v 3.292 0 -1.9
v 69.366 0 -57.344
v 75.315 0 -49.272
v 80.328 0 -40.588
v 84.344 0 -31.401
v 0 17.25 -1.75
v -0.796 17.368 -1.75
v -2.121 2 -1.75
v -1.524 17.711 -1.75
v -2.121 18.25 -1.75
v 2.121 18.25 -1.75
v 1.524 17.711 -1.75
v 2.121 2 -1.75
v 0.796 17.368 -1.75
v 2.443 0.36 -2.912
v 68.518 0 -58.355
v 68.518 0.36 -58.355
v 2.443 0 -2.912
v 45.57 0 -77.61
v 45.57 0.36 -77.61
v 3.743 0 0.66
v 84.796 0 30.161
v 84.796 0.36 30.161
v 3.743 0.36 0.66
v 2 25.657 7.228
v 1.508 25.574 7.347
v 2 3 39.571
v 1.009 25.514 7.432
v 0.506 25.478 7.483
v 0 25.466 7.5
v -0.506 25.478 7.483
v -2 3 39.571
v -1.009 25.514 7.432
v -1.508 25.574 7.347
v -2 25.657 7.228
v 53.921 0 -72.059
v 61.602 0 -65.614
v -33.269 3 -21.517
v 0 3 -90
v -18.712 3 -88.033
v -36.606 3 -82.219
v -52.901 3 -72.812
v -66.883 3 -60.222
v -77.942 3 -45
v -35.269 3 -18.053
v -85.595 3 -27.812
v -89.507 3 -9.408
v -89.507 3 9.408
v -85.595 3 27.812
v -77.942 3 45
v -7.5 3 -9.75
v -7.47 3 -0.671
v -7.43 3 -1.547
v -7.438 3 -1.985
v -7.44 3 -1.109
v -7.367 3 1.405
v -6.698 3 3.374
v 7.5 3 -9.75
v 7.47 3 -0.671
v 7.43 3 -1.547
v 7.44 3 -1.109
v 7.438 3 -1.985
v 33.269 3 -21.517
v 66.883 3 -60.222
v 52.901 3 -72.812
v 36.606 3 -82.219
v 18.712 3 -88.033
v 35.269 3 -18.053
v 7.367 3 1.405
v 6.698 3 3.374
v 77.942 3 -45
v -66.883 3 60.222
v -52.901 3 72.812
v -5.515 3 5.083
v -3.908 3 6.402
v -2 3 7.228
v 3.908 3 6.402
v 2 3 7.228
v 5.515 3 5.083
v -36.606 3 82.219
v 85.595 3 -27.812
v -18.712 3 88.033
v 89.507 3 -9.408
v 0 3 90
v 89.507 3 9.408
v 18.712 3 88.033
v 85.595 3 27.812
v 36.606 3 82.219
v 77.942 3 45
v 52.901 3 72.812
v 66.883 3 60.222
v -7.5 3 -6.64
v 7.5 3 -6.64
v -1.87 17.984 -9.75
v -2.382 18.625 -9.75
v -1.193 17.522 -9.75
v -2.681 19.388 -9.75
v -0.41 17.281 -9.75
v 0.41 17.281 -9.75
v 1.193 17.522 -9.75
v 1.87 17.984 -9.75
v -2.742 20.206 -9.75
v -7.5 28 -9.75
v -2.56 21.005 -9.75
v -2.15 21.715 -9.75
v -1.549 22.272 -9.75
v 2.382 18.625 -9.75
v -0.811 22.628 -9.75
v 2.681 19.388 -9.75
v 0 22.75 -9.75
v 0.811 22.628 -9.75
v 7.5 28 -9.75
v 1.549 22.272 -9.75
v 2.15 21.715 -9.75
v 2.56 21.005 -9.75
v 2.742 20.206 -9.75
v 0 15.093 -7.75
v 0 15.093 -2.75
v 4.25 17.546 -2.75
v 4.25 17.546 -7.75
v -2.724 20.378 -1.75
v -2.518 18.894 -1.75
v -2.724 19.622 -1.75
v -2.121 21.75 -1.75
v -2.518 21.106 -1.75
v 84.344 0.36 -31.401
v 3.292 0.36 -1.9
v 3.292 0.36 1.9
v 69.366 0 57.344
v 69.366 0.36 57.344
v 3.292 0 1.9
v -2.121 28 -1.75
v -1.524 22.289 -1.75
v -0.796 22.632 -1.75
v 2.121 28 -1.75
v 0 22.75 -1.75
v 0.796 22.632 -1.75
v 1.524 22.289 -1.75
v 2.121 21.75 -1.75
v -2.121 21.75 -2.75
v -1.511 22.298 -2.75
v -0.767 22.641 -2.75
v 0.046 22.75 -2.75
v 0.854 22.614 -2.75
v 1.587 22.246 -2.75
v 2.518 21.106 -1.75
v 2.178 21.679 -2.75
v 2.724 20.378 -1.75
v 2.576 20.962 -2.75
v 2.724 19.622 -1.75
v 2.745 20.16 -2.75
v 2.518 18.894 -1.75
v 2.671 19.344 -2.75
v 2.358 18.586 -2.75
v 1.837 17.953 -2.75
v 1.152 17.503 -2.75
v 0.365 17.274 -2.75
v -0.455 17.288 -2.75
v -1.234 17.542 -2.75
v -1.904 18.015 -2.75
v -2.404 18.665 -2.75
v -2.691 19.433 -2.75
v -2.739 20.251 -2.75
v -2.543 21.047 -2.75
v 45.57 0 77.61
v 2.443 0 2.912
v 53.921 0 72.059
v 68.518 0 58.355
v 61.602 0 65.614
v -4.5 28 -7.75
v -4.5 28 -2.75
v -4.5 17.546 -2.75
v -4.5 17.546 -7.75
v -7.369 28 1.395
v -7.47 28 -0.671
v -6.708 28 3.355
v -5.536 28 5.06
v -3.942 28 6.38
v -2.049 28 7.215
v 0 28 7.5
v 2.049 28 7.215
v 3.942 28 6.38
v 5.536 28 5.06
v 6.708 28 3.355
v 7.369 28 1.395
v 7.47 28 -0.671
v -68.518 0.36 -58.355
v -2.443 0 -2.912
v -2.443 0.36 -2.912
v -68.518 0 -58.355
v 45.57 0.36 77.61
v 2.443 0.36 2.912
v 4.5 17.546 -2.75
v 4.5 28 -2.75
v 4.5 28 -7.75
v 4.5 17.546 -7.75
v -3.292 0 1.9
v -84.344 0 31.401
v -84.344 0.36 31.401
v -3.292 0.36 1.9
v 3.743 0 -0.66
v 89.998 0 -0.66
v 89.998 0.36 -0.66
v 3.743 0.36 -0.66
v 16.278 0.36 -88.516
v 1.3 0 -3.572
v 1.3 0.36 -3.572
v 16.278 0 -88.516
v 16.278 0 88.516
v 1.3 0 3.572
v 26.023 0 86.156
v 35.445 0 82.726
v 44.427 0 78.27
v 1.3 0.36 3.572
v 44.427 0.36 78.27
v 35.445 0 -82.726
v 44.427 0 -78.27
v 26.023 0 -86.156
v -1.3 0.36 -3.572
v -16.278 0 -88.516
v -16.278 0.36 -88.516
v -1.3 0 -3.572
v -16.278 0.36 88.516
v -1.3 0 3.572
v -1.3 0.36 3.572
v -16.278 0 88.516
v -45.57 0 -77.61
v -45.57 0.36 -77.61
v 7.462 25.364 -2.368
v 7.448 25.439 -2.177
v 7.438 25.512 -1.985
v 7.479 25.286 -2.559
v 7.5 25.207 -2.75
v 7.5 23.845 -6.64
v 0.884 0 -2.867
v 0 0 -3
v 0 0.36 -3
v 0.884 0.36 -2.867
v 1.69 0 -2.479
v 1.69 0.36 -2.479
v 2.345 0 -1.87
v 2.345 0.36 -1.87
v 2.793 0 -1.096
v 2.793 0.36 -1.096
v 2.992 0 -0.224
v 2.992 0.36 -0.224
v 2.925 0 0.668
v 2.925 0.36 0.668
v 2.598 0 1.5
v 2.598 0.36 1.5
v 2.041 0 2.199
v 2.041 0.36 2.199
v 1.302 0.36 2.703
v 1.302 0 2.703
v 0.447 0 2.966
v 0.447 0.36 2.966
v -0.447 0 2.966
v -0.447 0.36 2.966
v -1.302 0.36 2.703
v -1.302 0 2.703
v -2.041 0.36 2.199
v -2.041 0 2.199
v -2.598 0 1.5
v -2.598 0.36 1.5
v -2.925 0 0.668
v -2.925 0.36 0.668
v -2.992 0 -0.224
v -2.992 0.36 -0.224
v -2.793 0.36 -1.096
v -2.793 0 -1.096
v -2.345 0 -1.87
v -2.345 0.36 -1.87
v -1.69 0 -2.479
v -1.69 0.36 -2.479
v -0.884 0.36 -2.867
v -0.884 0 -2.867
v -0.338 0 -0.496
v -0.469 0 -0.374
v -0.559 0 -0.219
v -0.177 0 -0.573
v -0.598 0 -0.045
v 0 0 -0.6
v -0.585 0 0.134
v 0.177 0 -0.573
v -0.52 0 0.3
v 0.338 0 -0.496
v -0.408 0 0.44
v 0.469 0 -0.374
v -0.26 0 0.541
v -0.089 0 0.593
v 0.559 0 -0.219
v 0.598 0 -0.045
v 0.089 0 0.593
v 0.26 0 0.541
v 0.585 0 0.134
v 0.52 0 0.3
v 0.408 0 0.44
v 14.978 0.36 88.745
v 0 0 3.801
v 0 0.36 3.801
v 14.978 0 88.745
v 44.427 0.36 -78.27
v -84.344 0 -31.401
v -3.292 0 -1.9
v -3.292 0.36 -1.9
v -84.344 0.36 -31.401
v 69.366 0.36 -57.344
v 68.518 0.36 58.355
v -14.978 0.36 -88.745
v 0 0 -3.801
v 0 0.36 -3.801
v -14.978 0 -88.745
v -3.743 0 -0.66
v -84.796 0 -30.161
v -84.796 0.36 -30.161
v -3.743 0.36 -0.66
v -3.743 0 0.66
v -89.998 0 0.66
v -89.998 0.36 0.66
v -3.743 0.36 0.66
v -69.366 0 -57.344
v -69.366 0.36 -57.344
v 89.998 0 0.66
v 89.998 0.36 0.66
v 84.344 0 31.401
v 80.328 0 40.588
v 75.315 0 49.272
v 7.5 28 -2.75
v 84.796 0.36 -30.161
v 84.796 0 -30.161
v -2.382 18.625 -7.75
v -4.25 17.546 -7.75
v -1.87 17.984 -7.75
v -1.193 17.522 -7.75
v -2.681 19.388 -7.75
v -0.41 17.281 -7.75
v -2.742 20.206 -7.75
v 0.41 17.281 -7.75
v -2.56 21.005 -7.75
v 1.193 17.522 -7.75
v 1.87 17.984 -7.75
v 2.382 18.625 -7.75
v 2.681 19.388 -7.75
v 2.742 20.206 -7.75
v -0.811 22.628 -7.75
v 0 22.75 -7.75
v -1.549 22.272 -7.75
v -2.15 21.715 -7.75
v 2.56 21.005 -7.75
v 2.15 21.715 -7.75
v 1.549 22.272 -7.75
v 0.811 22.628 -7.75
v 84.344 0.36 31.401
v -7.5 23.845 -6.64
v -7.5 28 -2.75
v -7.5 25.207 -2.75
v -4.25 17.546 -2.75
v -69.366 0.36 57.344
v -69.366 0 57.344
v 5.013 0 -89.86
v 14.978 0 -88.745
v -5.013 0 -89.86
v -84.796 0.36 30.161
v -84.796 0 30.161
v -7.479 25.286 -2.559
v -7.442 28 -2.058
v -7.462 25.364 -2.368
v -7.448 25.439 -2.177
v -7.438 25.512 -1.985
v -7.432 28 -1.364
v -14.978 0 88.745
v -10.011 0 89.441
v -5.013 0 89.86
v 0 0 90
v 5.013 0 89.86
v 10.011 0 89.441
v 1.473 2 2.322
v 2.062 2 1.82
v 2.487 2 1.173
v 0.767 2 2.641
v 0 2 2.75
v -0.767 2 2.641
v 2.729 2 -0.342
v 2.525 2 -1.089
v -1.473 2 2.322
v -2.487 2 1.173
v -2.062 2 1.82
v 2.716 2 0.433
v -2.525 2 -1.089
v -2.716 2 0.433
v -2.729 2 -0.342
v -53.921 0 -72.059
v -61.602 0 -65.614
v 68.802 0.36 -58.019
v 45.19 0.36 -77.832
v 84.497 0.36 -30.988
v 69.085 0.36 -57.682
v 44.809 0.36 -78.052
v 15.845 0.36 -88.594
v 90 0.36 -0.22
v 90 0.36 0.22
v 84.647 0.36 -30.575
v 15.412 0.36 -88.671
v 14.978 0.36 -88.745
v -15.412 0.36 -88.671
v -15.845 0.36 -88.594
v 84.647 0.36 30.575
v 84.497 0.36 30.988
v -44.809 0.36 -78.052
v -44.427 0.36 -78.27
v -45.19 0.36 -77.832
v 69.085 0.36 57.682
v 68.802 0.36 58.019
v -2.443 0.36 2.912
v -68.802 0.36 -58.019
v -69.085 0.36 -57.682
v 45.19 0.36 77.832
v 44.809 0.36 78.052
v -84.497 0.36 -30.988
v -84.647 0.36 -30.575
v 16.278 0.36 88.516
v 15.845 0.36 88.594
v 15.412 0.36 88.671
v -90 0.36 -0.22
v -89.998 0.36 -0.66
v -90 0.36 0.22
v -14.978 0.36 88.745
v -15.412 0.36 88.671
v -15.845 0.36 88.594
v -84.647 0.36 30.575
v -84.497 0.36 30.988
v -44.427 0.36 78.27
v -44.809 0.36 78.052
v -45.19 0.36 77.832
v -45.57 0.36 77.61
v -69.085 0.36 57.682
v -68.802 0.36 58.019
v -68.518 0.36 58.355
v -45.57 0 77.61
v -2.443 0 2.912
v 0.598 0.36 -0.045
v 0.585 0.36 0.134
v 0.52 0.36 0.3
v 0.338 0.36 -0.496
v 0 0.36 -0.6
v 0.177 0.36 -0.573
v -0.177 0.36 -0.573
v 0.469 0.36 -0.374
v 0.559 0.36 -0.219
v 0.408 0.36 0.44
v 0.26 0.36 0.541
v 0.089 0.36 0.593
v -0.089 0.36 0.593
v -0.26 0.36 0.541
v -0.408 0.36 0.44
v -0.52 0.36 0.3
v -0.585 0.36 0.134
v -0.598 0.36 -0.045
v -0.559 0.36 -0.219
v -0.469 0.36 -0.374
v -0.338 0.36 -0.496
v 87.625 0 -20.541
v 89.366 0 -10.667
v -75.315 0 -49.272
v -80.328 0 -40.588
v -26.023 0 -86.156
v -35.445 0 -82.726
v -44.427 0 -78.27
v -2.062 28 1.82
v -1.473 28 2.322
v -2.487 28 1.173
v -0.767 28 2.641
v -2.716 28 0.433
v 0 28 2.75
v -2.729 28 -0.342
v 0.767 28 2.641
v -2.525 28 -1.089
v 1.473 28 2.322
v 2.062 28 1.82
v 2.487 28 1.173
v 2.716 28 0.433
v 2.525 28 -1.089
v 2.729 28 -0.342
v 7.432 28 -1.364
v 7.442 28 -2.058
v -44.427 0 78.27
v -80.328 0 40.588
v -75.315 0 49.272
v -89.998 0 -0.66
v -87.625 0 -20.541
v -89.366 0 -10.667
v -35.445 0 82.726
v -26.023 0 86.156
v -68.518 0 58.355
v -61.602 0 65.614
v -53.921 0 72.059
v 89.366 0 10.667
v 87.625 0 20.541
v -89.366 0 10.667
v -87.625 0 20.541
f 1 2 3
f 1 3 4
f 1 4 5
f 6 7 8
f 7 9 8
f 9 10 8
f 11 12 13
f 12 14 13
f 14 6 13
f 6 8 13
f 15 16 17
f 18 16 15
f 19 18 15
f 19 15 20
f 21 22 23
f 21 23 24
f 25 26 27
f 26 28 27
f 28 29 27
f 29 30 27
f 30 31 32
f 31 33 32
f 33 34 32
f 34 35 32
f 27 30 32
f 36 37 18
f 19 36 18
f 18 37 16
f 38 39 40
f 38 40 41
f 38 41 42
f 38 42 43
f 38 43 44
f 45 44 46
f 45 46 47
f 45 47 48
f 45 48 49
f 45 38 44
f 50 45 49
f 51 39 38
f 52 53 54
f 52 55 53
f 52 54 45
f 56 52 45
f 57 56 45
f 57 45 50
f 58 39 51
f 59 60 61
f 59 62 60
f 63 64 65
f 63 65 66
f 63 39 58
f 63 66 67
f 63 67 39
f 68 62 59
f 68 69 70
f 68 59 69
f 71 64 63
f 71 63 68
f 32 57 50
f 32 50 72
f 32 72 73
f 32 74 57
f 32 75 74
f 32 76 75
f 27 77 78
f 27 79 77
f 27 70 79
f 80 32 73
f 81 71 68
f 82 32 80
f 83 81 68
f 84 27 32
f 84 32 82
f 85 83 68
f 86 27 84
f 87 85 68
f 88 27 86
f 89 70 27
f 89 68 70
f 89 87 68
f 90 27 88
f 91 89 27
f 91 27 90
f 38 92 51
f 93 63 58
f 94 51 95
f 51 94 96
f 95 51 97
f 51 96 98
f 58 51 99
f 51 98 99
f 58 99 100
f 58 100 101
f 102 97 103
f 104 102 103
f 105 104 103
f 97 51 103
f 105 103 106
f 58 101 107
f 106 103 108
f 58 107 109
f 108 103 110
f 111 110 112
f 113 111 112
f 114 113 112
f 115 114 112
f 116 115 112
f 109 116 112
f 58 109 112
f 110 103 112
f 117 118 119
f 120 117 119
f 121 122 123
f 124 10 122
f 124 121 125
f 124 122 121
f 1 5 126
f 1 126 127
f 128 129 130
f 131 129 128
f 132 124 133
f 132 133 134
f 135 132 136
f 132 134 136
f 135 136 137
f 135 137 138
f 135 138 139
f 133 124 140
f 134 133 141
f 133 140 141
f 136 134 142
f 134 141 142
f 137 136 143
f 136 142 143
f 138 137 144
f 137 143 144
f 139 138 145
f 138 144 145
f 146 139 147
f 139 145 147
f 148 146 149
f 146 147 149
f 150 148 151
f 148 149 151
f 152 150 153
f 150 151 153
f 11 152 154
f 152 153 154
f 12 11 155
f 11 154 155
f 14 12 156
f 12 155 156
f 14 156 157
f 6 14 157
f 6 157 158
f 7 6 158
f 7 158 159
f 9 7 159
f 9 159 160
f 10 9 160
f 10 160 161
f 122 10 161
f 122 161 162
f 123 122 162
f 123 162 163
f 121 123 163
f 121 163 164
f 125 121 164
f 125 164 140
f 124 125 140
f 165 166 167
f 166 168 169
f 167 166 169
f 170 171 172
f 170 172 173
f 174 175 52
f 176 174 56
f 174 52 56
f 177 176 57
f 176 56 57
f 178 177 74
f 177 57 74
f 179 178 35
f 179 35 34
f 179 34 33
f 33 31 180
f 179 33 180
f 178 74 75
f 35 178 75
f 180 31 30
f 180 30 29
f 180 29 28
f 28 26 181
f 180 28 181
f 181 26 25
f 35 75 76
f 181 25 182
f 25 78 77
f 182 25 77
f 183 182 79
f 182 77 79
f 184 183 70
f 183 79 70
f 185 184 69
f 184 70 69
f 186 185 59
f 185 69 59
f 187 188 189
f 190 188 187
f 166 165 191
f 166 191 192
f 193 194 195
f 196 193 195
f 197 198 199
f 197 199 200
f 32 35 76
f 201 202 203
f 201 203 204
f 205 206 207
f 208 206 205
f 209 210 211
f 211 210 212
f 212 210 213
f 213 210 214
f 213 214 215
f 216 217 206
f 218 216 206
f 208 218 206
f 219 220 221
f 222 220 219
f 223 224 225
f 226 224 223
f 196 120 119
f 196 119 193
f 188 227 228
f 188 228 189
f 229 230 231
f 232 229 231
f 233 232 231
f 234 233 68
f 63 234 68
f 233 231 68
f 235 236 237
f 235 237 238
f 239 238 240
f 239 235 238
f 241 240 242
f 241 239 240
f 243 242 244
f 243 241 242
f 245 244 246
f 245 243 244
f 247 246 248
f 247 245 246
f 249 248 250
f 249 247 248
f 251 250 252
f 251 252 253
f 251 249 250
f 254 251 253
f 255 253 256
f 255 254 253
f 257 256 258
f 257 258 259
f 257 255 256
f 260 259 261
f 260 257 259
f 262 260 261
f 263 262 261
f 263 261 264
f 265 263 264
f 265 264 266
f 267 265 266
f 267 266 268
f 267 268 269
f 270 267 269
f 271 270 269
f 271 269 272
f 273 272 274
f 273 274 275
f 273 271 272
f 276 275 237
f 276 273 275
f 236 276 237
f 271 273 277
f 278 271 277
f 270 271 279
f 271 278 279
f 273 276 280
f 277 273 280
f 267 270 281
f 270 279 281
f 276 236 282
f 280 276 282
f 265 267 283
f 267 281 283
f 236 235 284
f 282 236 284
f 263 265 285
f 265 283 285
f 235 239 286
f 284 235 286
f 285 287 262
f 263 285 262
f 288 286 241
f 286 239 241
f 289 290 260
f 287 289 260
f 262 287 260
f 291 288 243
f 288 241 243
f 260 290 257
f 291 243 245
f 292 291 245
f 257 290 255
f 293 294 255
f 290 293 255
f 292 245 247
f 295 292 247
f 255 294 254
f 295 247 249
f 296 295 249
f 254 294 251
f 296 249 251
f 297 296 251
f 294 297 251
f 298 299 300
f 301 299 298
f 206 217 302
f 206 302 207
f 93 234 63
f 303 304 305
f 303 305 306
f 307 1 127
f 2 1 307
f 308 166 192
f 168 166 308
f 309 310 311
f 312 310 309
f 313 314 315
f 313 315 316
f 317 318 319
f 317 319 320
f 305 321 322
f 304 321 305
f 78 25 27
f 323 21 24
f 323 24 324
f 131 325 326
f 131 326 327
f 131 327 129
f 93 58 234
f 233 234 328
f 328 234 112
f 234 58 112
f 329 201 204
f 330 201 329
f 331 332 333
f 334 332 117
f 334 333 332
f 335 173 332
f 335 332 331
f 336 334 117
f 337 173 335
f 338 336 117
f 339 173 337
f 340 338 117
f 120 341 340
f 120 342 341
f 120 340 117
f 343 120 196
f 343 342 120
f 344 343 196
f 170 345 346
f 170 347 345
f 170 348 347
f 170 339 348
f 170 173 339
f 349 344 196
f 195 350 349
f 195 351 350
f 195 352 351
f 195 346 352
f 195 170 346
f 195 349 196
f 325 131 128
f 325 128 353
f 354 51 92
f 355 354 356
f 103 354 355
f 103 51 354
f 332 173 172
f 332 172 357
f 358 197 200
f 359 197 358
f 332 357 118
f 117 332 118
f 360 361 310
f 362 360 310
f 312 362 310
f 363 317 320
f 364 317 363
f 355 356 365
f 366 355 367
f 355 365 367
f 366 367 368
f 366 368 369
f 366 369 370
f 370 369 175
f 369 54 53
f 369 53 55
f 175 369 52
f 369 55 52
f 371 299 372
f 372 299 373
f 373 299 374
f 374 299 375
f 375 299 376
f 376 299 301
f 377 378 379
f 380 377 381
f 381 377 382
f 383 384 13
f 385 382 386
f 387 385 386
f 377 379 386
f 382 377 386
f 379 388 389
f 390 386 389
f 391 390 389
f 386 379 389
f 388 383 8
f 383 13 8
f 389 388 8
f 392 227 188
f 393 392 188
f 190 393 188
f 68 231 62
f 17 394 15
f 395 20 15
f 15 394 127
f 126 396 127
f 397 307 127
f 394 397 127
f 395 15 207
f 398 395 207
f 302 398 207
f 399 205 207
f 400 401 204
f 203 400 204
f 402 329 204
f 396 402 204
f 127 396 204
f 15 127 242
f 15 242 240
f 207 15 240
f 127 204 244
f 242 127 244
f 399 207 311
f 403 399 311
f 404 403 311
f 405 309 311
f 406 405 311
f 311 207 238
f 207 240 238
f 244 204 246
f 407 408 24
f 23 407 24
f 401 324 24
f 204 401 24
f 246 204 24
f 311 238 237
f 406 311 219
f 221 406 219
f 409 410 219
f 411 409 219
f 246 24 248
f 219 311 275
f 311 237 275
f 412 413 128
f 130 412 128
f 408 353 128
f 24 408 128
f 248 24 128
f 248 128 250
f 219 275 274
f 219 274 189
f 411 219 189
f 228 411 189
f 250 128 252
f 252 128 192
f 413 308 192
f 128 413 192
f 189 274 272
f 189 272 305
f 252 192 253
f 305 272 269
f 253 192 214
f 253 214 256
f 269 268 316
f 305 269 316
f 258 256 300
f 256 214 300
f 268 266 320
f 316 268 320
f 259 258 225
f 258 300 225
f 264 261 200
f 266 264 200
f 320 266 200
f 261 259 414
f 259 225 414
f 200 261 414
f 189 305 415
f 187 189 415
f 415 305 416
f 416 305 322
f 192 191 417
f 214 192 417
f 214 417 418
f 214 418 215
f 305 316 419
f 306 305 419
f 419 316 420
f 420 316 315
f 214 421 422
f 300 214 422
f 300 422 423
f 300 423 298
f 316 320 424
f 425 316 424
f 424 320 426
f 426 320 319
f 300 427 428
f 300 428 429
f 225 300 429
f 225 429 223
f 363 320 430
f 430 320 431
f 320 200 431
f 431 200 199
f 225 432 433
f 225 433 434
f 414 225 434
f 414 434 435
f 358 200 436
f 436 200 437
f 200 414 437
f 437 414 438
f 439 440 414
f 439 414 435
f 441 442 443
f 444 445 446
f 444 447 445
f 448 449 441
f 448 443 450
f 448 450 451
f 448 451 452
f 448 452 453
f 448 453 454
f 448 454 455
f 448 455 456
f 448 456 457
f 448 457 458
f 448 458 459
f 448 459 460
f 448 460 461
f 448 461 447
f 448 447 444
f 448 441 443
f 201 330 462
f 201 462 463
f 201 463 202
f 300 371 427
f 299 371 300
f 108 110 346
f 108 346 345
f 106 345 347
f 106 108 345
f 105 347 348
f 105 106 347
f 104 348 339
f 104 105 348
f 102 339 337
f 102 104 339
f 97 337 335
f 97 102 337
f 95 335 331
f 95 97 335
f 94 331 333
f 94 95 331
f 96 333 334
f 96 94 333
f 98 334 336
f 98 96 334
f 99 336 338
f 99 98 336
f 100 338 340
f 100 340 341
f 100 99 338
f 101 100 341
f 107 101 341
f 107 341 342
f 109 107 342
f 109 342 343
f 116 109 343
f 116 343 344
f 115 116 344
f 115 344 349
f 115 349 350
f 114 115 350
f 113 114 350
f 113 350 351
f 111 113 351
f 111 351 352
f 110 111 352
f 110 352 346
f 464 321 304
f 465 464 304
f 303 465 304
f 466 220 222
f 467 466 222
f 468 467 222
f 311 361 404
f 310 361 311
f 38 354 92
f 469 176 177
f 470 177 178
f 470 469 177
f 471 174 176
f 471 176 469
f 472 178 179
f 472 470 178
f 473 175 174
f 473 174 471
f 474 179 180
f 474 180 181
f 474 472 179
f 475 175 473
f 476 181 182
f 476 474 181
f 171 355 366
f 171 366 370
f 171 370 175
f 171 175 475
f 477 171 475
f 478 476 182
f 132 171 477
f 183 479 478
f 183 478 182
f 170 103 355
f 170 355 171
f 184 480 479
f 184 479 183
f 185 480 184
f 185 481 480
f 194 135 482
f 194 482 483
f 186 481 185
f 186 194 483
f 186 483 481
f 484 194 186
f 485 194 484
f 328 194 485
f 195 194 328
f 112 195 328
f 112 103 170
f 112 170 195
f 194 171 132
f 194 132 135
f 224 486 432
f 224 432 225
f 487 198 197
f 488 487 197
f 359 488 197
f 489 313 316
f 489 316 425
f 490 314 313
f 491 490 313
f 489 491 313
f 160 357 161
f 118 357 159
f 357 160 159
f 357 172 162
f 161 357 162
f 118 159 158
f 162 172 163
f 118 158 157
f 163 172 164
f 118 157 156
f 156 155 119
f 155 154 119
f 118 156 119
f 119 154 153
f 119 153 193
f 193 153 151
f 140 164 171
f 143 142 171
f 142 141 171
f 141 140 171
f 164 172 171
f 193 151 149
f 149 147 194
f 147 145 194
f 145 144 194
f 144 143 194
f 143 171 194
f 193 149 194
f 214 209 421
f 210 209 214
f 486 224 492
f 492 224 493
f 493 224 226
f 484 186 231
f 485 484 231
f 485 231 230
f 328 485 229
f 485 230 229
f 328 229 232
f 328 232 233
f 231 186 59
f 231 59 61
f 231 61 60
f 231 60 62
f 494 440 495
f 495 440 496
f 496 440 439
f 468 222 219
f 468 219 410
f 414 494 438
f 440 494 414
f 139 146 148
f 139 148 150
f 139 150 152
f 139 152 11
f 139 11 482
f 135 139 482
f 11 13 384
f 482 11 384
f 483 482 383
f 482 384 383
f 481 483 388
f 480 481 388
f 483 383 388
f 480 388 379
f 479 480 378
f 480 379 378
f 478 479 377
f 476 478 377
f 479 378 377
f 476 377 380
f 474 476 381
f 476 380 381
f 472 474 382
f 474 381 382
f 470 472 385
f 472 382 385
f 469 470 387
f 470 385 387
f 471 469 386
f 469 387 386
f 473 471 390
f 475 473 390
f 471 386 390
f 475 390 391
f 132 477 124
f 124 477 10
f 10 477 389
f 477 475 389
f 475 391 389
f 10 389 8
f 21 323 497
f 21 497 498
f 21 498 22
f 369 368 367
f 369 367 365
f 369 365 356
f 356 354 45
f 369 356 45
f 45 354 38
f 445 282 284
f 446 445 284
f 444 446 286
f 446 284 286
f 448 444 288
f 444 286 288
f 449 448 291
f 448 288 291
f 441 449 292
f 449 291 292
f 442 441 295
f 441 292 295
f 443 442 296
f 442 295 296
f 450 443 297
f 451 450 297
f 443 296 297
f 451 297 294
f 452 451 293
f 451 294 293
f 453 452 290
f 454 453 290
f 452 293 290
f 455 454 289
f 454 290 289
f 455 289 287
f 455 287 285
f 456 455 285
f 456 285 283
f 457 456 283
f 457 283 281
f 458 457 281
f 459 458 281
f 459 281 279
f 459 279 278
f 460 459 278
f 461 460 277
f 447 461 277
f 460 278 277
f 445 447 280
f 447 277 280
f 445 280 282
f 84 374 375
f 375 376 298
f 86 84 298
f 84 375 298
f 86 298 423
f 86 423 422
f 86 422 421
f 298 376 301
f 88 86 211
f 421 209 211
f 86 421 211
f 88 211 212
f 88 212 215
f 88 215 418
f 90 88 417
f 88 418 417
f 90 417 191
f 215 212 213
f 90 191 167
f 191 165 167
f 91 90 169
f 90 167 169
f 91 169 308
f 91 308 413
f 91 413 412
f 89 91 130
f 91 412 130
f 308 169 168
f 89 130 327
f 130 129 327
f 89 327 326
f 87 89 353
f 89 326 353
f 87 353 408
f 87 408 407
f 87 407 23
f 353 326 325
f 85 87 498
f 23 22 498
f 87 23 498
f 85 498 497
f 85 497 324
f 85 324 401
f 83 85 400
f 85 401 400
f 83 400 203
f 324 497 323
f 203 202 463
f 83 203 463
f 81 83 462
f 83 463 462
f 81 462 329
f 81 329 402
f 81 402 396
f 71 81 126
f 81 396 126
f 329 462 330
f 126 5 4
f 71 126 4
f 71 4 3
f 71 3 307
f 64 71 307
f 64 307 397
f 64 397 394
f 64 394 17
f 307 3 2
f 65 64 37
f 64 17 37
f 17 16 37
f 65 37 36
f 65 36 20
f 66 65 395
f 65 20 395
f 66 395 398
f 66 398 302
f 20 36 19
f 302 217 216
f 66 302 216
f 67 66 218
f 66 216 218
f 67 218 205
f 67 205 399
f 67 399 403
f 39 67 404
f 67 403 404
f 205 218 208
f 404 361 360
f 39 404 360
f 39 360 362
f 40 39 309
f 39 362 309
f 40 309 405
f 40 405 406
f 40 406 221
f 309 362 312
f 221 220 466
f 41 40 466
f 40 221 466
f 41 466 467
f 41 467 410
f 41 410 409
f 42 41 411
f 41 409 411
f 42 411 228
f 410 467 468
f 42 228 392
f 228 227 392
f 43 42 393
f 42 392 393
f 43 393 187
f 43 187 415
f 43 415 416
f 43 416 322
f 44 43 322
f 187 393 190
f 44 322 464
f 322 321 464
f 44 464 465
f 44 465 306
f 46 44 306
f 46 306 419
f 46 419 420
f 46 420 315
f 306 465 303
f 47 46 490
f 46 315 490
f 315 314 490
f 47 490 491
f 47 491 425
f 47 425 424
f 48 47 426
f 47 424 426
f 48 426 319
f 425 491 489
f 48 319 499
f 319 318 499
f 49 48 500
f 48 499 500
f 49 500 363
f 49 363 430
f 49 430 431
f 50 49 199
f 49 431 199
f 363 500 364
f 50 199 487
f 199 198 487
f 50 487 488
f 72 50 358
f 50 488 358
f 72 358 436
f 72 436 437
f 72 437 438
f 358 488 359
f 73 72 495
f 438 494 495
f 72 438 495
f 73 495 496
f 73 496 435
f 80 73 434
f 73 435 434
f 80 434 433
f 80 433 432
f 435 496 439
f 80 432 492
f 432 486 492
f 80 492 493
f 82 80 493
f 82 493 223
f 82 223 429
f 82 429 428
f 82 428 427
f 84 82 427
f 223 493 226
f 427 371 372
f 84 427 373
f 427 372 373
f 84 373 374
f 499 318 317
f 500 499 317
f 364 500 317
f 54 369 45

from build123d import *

# Parameters (mm, degrees)
SKETCH1_R                = 90
BOSS_EXTRUDE1_DEPTH      = 3
SKETCH2_R                = 7.5
BOSS_EXTRUDE2_DEPTH      = 25
RIB5_REACH               = 132.323
SKETCH3_WALL_W           = 306.218438134
SKETCH3_WALL_H           = 4
CIRPATTERN1_COUNT        = 3
BOSS_EXTRUDE3_DEPTH      = 4
BOSS_EXTRUDE3_DEPTH_BACK = 3
BOSS_EXTRUDE3_START      = -5
SKETCH5_W                = 15
SKETCH5_H                = 25
SKETCH5_R                = 2.75
CUT_EXTRUDE3_DEPTH       = 130.711217711
CUT_EXTRUDE3_DEPTH_BACK  = 1
SKETCH8_R                = 2.75
CUT_EXTRUDE4_DEPTH       = 8
CUT_EXTRUDE1_START       = -1
CUT_EXTRUDE1_DEPTH       = 5
SKETCH9_W                = 11.211365442
SKETCH9_H                = 11.7257459
SKETCH9_R                = 2.75
BOSS_EXTRUDE4_DEPTH      = 2
SKETCH10_W               = 9
SKETCH10_H               = 5
CUT_EXTRUDE5_DEPTH       = 10.453739
FILLET1_START            = 2
FILLET1_DEPTH            = 26
SKETCH11_R               = 3
CUT_EXTRUDE6_DEPTH       = 0.36
SKETCH12_R               = 0.6
CUT_EXTRUDE7_DEPTH       = 0.36


with BuildPart() as part:
    # Sketch1 → Boss-Extrude1 (new body)
    with BuildSketch(Plane(origin=(0, 0, 0), x_dir=(1, 0, 0), z_dir=(0, 1, 0))):
        with Locations(Location((0, 0, 0), (0, 0, 270))):
            Circle(SKETCH1_R)
    extrude(amount=BOSS_EXTRUDE1_DEPTH)

    # Sketch2 → Boss-Extrude2 (add)
    with BuildSketch(Plane(origin=(0, 3, 0), x_dir=(1, 0, 0), z_dir=(0, 1, 0))):
        with Locations(Location((0, 0, 0), (0, 0, 270))):
            Circle(SKETCH2_R)
        with BuildLine():
            Line((-2.121320344, 1.75), (2.121320344, 1.75))
            ThreePointArc((2.121320344, 1.75), (0, -2.75), (-2.121320344, 1.75))
        make_face(mode=Mode.SUBTRACT)
    extrude(amount=BOSS_EXTRUDE2_DEPTH)

    # Sketch3 wall → Rib5 (add, up to next)
    with BuildSketch(Plane(origin=(0, 13.5, 24.582023983), x_dir=(0, -0.573748677161, 0.819031412985), z_dir=(0, -0.819031412985, -0.573748677161)), mode=Mode.PRIVATE) as rib5_sk1:
        Rectangle(SKETCH3_WALL_W, SKETCH3_WALL_H)
    rib5_tool1 = extrude(rib5_sk1.sketch, amount=RIB5_REACH, mode=Mode.PRIVATE) - part.part
    rib5 = rib5_tool1.solids().sort_by_distance((0, 13.5, 24.582023983))[0]
    add(rib5)

    # CirPattern1: Rib5 ×3 about axis
    cirpattern1_axis = Axis((0, 0, 0), (0, 1, 0))
    for i in range(1, CIRPATTERN1_COUNT):
        add(rib5.rotate(cirpattern1_axis, i * 360 / CIRPATTERN1_COUNT))

    # Sketch5 → Boss-Extrude3 (add, two sides: drawn at the far end of the back side and taken through both)
    with BuildSketch(Plane.XY.offset(-1.75).offset(BOSS_EXTRUDE3_START - BOSS_EXTRUDE3_DEPTH_BACK)):
        with Locations((0, 15.5)):
            Rectangle(SKETCH5_W, SKETCH5_H)
        with Locations(Location((0, 20, 0), (0, 0, 90))):
            Circle(SKETCH5_R, mode=Mode.SUBTRACT)
    extrude(amount=BOSS_EXTRUDE3_DEPTH + BOSS_EXTRUDE3_DEPTH_BACK)

    # Sketch7 → Cut-Extrude3 (cut, two sides: drawn at the far end of the back side and taken through both)
    with BuildSketch(Plane(origin=(0, 3, 0), x_dir=(1, 0, 0), z_dir=(0, 1, 0)).offset(-CUT_EXTRUDE3_DEPTH_BACK)):
        with BuildLine():
            Line((-2.121320344, 1.75), (2.121320344, 1.75))
            ThreePointArc((2.121320344, 1.75), (0, -2.75), (-2.121320344, 1.75))
        make_face()
    extrude(amount=CUT_EXTRUDE3_DEPTH + CUT_EXTRUDE3_DEPTH_BACK, mode=Mode.SUBTRACT)

    # Sketch8 → Cut-Extrude4 (cut)
    with BuildSketch(Plane(origin=(0, 0, -9.75), x_dir=(-1, 0, 0), z_dir=(0, 0, -1))):
        with Locations(Location((0, 20, 0), (0, 0, 39.521196359))):
            Circle(SKETCH8_R)
    extrude(amount=-CUT_EXTRUDE4_DEPTH, mode=Mode.SUBTRACT)

    # Sketch4 → Cut-Extrude1 (cut)
    with BuildSketch(Plane.XY.offset(-1.75).offset(CUT_EXTRUDE1_START)):
        Polygon((0, 24.907477288), (-4.25, 22.453738644), (-4.25, 17.546261356), (0, 15.092522712), (4.25, 17.546261356), (4.25, 22.453738644), align=None)
    extrude(amount=-CUT_EXTRUDE1_DEPTH, mode=Mode.SUBTRACT)

    # Sketch9 → Boss-Extrude4 (add)
    with BuildSketch(Plane(origin=(0, 0, -9.75), x_dir=(-1, 0, 0), z_dir=(0, 0, -1))):
        with Locations((0, 20)):
            Rectangle(SKETCH9_W, SKETCH9_H)
        with Locations(Location((0, 20, 0), (0, 0, 180))):
            Circle(SKETCH9_R, mode=Mode.SUBTRACT)
    extrude(amount=-BOSS_EXTRUDE4_DEPTH)

    # Sketch10 → Cut-Extrude5 (cut)
    with BuildSketch(Plane(origin=(0, 28, 0), x_dir=(1, 0, 0), z_dir=(0, 1, 0))):
        with Locations((0, 5.25)):
            Rectangle(SKETCH10_W, SKETCH10_H)
    extrude(amount=-CUT_EXTRUDE5_DEPTH, mode=Mode.SUBTRACT)

    # Fillet1: read off the stored shape, not the designer's step
    # Fillet1 outline → Fillet1 (add)
    with BuildSketch(Plane(origin=(0, 0, 0), x_dir=(1, 0, 0), z_dir=(0, 1, 0)).offset(FILLET1_START)):
        with BuildLine():
            ThreePointArc((-7.46988647, 0.671413522), (-7.29814404, 1.728321024), (-6.977642868, 2.75))
            Line((-6.977642868, 2.75), (-7.5, 2.75))
            ThreePointArc((-7.5, 2.75), (-7.430784372, 1.711491388), (-7.46988647, 0.671413522))
        make_face()
        with BuildLine():
            Line((7.5, 2.75), (6.977642868, 2.75))
            ThreePointArc((6.977642868, 2.75), (7.29814404, 1.728321024), (7.46988647, 0.671413522))
            ThreePointArc((7.46988647, 0.671413522), (7.430784372, 1.711491388), (7.5, 2.75))
        make_face()
    extrude(amount=FILLET1_DEPTH)

    # Sketch11 → Cut-Extrude6 (cut)
    with BuildSketch(Plane.XZ):
        with BuildLine():
            Line((-89.997579967, 0.66), (-3.743046001, 0.66))
            Line((-3.743046001, 0.66), (-84.795795079, 30.16078807))
            ThreePointArc((-84.795795079, 30.16078807), (-84.572335871, 30.781812899), (-84.344328489, 31.401182329))
            Line((-84.344328489, 31.401182329), (-3.291579412, 1.900394259))
            Line((-3.291579412, 1.900394259), (-69.366385851, 57.343739972))
            ThreePointArc((-69.366385851, 57.343739972), (-68.943999881, 57.850884872), (-68.517906206, 58.354918637))
            Line((-68.517906206, 58.354918637), (-2.443099767, 2.911572924))
            Line((-2.443099767, 2.911572924), (-45.57036675, 77.610190531))
            ThreePointArc((-45.57036675, 77.610190531), (-45, 77.942286341), (-44.427213217, 78.270190531))
            Line((-44.427213217, 78.270190531), (-1.299946234, 3.571572924))
            Line((-1.299946234, 3.571572924), (-16.277888873, 88.515706707))
            ThreePointArc((-16.277888873, 88.515706707), (-15.62833599, 88.632697771), (-14.977942639, 88.744922302))
            Line((-14.977942639, 88.744922302), (0, 3.800788519))
            Line((0, 3.800788519), (14.977942639, 88.744922302))
            ThreePointArc((14.977942639, 88.744922302), (15.62833599, 88.632697771), (16.277888873, 88.515706707))
            Line((16.277888873, 88.515706707), (1.299946234, 3.571572924))
            Line((1.299946234, 3.571572924), (44.427213217, 78.270190531))
            ThreePointArc((44.427213217, 78.270190531), (45, 77.942286341), (45.57036675, 77.610190531))
            Line((45.57036675, 77.610190531), (2.443099767, 2.911572924))
            Line((2.443099767, 2.911572924), (68.517906206, 58.354918637))
            ThreePointArc((68.517906206, 58.354918637), (68.943999881, 57.850884872), (69.366385851, 57.343739972))
            Line((69.366385851, 57.343739972), (3.291579412, 1.900394259))
            Line((3.291579412, 1.900394259), (84.344328489, 31.401182329))
            ThreePointArc((84.344328489, 31.401182329), (84.572335871, 30.781812899), (84.795795079, 30.16078807))
            Line((84.795795079, 30.16078807), (3.743046001, 0.66))
            Line((3.743046001, 0.66), (89.997579967, 0.66))
            ThreePointArc((89.997579967, 0.66), (90, 0), (89.997579967, -0.66))
            Line((89.997579967, -0.66), (3.743046001, -0.66))
            Line((3.743046001, -0.66), (84.795795079, -30.16078807))
            ThreePointArc((84.795795079, -30.16078807), (84.572335871, -30.781812899), (84.344328489, -31.401182329))
            Line((84.344328489, -31.401182329), (3.291579412, -1.900394259))
            Line((3.291579412, -1.900394259), (69.366385851, -57.343739972))
            ThreePointArc((69.366385851, -57.343739972), (68.943999881, -57.850884872), (68.517906206, -58.354918637))
            Line((68.517906206, -58.354918637), (2.443099767, -2.911572924))
            Line((2.443099767, -2.911572924), (45.57036675, -77.610190531))
            ThreePointArc((45.57036675, -77.610190531), (45, -77.942286341), (44.427213217, -78.270190531))
            Line((44.427213217, -78.270190531), (1.299946234, -3.571572924))
            Line((1.299946234, -3.571572924), (16.277888873, -88.515706707))
            ThreePointArc((16.277888873, -88.515706707), (15.62833599, -88.632697771), (14.977942639, -88.744922302))
            Line((14.977942639, -88.744922302), (0, -3.800788519))
            Line((0, -3.800788519), (-14.977942639, -88.744922302))
            ThreePointArc((-14.977942639, -88.744922302), (-15.62833599, -88.632697771), (-16.277888873, -88.515706707))
            Line((-16.277888873, -88.515706707), (-1.299946234, -3.571572924))
            Line((-1.299946234, -3.571572924), (-44.427213217, -78.270190531))
            ThreePointArc((-44.427213217, -78.270190531), (-45, -77.942286341), (-45.57036675, -77.610190531))
            Line((-45.57036675, -77.610190531), (-2.443099767, -2.911572924))
            Line((-2.443099767, -2.911572924), (-68.517906206, -58.354918637))
            ThreePointArc((-68.517906206, -58.354918637), (-68.943999881, -57.850884872), (-69.366385851, -57.343739972))
            Line((-69.366385851, -57.343739972), (-3.291579412, -1.900394259))
            Line((-3.291579412, -1.900394259), (-84.344328489, -31.401182329))
            ThreePointArc((-84.344328489, -31.401182329), (-84.572335871, -30.781812899), (-84.795795079, -30.16078807))
            Line((-84.795795079, -30.16078807), (-3.743046001, -0.66))
            Line((-3.743046001, -0.66), (-89.997579967, -0.66))
            ThreePointArc((-89.997579967, -0.66), (-90, 0), (-89.997579967, 0.66))
        make_face()
        with Locations(Location((0, 0, 0), (0, 0, 270))):
            Circle(SKETCH11_R, mode=Mode.SUBTRACT)
    extrude(amount=-CUT_EXTRUDE6_DEPTH, mode=Mode.SUBTRACT)

    # Sketch12 → Cut-Extrude7 (cut)
    with BuildSketch(Plane.XZ):
        with Locations(Location((0, 0, 0), (0, 0, 270))):
            Circle(SKETCH12_R)
    extrude(amount=-CUT_EXTRUDE7_DEPTH, mode=Mode.SUBTRACT)


solid = part.part
